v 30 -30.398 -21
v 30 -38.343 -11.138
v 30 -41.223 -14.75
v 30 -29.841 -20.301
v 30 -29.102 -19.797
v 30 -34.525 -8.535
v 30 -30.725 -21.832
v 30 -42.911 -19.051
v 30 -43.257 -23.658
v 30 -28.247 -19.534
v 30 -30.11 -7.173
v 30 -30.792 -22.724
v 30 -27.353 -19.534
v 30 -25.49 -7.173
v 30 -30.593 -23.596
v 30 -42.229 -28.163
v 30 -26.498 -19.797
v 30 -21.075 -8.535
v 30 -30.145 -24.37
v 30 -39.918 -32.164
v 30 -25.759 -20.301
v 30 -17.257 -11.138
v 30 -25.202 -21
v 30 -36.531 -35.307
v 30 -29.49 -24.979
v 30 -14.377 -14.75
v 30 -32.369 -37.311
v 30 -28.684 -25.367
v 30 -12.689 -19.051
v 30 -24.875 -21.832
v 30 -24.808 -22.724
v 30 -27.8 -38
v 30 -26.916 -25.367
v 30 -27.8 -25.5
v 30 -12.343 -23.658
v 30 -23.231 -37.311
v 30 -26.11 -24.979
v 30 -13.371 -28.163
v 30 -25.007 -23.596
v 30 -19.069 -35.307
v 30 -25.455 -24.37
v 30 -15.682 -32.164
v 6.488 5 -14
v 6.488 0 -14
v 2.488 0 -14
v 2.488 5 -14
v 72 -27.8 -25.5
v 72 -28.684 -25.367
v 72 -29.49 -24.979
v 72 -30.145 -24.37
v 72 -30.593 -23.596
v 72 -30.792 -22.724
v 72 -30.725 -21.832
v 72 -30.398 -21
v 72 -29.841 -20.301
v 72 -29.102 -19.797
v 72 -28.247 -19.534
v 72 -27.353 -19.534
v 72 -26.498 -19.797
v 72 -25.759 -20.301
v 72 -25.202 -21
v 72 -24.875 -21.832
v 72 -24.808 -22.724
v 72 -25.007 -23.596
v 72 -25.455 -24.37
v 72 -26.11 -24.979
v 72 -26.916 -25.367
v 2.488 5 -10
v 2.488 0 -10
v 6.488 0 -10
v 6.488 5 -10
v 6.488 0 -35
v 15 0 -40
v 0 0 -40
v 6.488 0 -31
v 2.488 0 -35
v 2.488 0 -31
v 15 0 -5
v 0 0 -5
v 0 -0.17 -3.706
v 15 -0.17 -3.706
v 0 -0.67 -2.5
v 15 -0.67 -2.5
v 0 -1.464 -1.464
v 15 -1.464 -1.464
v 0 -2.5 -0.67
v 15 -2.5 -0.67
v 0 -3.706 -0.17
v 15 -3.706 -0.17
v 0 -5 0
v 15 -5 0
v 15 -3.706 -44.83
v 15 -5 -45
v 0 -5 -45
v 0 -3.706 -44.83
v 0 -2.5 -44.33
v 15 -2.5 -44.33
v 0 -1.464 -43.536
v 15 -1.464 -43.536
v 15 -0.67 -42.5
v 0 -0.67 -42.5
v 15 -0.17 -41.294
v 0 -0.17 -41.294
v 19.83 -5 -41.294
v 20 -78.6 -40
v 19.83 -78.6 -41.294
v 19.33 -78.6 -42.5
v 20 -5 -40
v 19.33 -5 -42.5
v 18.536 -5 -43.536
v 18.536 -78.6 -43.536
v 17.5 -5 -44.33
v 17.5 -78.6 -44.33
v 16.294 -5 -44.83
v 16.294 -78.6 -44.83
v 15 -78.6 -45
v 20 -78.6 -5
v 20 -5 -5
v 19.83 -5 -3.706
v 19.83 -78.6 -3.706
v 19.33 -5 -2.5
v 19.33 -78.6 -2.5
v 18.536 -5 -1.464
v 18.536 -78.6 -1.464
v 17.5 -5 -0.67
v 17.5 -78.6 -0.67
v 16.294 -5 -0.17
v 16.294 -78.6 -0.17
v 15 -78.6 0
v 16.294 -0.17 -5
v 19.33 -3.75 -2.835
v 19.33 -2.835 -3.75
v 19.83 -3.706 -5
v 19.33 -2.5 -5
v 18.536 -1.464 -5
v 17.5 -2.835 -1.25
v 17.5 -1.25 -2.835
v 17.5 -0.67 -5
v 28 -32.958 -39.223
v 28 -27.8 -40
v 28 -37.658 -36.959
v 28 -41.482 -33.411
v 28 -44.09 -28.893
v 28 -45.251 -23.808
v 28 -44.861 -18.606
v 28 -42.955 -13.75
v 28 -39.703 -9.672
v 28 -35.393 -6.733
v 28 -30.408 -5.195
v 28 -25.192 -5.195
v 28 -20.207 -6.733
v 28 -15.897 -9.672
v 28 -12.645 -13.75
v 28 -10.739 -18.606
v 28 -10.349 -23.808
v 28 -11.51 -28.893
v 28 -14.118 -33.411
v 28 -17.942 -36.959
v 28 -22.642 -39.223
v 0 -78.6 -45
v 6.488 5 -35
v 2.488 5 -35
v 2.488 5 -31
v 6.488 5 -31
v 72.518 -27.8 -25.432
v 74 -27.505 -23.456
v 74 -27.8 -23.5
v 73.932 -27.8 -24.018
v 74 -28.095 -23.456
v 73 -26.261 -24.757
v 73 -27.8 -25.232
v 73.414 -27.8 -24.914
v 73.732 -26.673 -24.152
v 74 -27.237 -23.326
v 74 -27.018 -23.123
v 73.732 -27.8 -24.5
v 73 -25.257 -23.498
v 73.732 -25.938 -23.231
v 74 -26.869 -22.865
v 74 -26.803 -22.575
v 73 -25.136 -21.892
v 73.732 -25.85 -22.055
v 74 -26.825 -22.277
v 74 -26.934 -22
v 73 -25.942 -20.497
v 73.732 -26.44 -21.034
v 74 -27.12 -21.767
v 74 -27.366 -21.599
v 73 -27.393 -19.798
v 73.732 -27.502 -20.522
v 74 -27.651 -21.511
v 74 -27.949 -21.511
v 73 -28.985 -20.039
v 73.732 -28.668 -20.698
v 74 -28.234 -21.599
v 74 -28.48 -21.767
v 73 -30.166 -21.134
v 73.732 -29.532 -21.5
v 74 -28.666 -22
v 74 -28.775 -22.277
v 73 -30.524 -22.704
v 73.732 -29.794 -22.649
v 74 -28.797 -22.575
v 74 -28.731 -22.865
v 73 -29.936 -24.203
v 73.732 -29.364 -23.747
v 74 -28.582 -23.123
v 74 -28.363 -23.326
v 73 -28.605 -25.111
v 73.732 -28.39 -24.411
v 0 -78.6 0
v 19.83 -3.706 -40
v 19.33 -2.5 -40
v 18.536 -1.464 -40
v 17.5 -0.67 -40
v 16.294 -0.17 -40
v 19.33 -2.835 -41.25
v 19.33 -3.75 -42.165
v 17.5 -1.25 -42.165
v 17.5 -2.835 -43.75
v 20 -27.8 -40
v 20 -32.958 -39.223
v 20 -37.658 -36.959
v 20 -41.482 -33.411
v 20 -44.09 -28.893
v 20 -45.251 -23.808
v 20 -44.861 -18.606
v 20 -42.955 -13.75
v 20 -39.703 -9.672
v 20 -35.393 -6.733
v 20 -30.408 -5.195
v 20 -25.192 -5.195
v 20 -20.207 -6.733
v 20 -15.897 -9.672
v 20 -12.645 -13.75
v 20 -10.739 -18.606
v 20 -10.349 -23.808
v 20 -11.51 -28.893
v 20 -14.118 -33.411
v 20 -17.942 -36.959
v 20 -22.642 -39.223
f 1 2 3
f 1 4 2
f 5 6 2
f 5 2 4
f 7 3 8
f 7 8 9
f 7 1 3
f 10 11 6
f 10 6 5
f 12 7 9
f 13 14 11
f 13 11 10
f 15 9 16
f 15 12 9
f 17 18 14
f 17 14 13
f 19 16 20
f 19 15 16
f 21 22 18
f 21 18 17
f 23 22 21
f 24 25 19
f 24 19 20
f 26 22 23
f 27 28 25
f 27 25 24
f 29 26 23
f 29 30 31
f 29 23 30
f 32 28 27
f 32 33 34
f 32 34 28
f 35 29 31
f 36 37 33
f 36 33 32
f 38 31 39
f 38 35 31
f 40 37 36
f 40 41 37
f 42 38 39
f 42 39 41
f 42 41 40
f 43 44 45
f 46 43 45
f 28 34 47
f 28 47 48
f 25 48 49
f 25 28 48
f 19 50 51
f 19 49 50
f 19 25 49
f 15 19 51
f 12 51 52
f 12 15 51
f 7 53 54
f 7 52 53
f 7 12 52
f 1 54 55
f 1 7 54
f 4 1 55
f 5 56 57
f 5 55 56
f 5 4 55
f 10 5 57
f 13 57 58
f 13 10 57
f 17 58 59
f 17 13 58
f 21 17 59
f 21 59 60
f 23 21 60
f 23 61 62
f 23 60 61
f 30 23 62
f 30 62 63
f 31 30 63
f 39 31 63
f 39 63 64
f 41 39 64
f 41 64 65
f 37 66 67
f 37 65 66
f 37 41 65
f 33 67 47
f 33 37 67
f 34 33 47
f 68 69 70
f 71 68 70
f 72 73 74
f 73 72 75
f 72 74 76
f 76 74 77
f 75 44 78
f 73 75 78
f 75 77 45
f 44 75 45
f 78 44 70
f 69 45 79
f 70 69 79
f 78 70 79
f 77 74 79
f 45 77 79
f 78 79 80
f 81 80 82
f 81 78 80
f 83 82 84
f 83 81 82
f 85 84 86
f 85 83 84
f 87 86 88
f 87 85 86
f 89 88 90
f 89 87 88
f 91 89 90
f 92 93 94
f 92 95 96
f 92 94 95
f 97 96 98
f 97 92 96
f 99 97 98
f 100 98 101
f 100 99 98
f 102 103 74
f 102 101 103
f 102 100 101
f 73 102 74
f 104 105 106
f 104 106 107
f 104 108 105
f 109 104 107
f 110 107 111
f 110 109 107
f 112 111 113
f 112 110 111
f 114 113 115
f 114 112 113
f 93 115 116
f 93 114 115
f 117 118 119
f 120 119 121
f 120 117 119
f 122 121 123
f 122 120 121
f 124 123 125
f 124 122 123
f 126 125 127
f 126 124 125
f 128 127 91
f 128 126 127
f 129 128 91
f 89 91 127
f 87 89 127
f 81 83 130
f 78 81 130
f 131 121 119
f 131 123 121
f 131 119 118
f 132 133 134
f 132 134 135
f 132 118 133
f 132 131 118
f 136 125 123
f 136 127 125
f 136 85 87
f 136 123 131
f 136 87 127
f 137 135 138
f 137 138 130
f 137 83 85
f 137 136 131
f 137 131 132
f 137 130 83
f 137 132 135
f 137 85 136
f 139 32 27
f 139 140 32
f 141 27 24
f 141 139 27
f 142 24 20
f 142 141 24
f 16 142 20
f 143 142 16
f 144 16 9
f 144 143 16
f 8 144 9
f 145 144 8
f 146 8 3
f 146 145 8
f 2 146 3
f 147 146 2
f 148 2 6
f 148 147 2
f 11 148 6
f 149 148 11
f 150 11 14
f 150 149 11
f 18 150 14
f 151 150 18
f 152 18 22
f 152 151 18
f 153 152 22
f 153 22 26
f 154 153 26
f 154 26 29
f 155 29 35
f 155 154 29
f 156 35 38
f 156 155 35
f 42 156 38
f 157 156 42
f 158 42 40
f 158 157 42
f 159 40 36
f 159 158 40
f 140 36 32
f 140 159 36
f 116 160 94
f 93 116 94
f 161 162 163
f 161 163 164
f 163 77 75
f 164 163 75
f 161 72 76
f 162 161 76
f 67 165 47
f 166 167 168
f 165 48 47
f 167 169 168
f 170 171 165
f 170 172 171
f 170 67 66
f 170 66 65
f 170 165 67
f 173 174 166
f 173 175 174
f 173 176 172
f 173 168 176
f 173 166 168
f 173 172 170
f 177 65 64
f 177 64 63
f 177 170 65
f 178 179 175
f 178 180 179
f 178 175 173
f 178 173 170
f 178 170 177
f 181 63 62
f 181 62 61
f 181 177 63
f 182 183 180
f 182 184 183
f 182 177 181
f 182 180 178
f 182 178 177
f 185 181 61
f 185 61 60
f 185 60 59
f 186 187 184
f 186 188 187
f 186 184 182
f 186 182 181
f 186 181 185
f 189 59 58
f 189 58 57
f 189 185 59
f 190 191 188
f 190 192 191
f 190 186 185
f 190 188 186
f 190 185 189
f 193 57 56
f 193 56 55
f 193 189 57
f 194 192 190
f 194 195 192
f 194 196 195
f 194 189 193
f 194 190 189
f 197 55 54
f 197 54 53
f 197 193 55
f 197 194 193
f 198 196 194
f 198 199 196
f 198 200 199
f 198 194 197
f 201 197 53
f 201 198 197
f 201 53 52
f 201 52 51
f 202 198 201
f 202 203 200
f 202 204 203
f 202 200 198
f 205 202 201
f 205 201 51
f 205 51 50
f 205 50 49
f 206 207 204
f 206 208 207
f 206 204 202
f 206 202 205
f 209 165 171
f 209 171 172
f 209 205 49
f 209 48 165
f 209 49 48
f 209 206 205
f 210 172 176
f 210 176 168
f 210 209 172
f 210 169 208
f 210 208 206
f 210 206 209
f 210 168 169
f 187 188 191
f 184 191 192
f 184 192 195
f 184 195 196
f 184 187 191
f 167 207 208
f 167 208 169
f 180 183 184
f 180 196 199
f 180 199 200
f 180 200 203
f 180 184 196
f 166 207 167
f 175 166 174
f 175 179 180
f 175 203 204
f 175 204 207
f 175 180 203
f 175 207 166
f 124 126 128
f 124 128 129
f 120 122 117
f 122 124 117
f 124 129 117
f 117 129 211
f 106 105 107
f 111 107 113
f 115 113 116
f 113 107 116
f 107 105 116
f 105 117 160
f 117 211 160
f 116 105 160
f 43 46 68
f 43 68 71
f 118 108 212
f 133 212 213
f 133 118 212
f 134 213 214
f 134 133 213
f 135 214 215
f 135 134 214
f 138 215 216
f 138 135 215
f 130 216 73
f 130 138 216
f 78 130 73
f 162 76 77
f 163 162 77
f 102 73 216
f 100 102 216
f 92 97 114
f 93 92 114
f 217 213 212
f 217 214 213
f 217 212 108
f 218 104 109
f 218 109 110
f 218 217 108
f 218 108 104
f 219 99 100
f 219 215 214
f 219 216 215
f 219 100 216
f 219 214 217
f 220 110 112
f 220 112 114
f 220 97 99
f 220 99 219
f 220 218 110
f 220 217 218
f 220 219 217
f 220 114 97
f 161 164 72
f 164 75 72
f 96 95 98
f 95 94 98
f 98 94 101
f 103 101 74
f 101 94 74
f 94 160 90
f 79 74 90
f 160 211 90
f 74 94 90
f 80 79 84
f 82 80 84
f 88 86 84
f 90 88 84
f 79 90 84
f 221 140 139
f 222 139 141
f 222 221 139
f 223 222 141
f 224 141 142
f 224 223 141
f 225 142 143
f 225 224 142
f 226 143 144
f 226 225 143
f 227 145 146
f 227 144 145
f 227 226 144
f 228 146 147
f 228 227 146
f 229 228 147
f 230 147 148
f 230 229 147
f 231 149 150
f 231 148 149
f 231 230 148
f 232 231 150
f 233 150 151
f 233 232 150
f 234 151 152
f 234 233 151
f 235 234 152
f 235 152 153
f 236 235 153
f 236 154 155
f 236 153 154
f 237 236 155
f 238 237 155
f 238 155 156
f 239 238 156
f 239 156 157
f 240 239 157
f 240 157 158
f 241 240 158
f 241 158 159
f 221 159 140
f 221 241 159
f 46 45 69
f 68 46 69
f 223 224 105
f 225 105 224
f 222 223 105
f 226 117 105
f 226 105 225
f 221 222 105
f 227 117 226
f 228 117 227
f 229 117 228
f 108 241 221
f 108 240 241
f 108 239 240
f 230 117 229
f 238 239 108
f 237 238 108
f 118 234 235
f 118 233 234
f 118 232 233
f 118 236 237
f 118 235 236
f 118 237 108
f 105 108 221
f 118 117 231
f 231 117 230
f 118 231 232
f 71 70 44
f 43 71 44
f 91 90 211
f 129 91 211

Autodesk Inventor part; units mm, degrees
ref_plane "YZ Plane" through (0, 0, 0) normal (1, 0, 0) x (0, 1, 0)
ref_plane "XZ Plane" through (0, 0, 0) normal (0, 1, 0) x (-1, 0, 0)
ref_plane "XY Plane" through (0, 0, 0) normal (0, 0, 1) x (1, 0, 0)
sketch "Sketch1" plane through (0, 0, 0) normal (1, 0, 0) x (0, 1, 0)
  line L0 (0, 0) -> (-78.6, 0)
  line L1 (-78.6, 0) -> (-78.6, -45)
  line L2 (-78.6, -45) -> (0, -45)
  line L3 (0, -45) -> (0, 0)
  dimension "d0" = 78.6
  dimension "d1" = 45
extrude "Extrusion1" add sketch "Sketch1" along normal blind 20
sketch "Sketch2" plane through (20, 0, 0) normal (1, 0, 0) x (0, 0, -1)
  circle A0 centre (22.5, -27.8) radius 17.5
  line L0 (45, -78.6) -> (45, 0) projected
  line L1 (0, -78.6) -> (45, -78.6) projected
  point P0 (0, 0)
  dimension "d4" = 35
  dimension "d5" = 22.5
  dimension "d6" = 50.8
extrude "Extrusion2" add sketch "Sketch2" along normal blind 10
sketch "Sketch3" plane through (30, -27.8, -22.5) normal (1, 0, 0) x (0, 0, -1)
  circle A0 centre (0, 0) radius 3
  point P0 (-22.5, 27.8)
  dimension "d9" = 6
extrude "Extrusion3" add sketch "Sketch3" along normal blind 44
fillet "Fillet1" radius 5 2 edges at (10, 0, 0) (10, 0, -45)
sketch "Sketch4" plane through (0, 0, -5) normal (0, 1, 0) x (1, 0, 0)
  line L0 (6.488, 30) -> (2.488, 30)
  line L1 (2.488, 30) -> (2.488, 26)
  line L2 (2.488, 26) -> (6.488, 26)
  line L3 (6.488, 26) -> (6.488, 30)
  line L4 (6.488, 9) -> (2.488, 9)
  line L5 (2.488, 9) -> (2.488, 5)
  line L6 (2.488, 5) -> (6.488, 5)
  line L7 (6.488, 5) -> (6.488, 9)
  line L8 (0, 35) -> (20, 35) projected
  line L9 (20, 0) -> (0, 0) projected
  point P0 (0, -5)
  dimension "d13" = 4
  dimension "d14" = 4
  dimension "d15" = 4
  dimension "d16" = 4
  dimension "d17" = 5
  dimension "d18" = 9
extrude "Extrusion4" add sketch "Sketch4" along normal blind 5
chamfer "Chamfer1" distance 2 angle 45 1 edges at (30, -27.8, -5)
fillet "Fillet2" radius 5 5 edges at (20, -1.4645, -1.4645) (20, -41.8, 0) (20, -1.4645, -43.5355) (20, -41.8, -45) (20, 0, -22.5)
fillet "Fillet3" radius 2 1 edges at (74, -27.8, -19.5)
sketch "Sketch5" plane through (30, -27.8, -22.5) normal (1, 0, 0) x (0, 0, -1)
  point P0 (-22.5, 27.8)
properties part number "dc"
